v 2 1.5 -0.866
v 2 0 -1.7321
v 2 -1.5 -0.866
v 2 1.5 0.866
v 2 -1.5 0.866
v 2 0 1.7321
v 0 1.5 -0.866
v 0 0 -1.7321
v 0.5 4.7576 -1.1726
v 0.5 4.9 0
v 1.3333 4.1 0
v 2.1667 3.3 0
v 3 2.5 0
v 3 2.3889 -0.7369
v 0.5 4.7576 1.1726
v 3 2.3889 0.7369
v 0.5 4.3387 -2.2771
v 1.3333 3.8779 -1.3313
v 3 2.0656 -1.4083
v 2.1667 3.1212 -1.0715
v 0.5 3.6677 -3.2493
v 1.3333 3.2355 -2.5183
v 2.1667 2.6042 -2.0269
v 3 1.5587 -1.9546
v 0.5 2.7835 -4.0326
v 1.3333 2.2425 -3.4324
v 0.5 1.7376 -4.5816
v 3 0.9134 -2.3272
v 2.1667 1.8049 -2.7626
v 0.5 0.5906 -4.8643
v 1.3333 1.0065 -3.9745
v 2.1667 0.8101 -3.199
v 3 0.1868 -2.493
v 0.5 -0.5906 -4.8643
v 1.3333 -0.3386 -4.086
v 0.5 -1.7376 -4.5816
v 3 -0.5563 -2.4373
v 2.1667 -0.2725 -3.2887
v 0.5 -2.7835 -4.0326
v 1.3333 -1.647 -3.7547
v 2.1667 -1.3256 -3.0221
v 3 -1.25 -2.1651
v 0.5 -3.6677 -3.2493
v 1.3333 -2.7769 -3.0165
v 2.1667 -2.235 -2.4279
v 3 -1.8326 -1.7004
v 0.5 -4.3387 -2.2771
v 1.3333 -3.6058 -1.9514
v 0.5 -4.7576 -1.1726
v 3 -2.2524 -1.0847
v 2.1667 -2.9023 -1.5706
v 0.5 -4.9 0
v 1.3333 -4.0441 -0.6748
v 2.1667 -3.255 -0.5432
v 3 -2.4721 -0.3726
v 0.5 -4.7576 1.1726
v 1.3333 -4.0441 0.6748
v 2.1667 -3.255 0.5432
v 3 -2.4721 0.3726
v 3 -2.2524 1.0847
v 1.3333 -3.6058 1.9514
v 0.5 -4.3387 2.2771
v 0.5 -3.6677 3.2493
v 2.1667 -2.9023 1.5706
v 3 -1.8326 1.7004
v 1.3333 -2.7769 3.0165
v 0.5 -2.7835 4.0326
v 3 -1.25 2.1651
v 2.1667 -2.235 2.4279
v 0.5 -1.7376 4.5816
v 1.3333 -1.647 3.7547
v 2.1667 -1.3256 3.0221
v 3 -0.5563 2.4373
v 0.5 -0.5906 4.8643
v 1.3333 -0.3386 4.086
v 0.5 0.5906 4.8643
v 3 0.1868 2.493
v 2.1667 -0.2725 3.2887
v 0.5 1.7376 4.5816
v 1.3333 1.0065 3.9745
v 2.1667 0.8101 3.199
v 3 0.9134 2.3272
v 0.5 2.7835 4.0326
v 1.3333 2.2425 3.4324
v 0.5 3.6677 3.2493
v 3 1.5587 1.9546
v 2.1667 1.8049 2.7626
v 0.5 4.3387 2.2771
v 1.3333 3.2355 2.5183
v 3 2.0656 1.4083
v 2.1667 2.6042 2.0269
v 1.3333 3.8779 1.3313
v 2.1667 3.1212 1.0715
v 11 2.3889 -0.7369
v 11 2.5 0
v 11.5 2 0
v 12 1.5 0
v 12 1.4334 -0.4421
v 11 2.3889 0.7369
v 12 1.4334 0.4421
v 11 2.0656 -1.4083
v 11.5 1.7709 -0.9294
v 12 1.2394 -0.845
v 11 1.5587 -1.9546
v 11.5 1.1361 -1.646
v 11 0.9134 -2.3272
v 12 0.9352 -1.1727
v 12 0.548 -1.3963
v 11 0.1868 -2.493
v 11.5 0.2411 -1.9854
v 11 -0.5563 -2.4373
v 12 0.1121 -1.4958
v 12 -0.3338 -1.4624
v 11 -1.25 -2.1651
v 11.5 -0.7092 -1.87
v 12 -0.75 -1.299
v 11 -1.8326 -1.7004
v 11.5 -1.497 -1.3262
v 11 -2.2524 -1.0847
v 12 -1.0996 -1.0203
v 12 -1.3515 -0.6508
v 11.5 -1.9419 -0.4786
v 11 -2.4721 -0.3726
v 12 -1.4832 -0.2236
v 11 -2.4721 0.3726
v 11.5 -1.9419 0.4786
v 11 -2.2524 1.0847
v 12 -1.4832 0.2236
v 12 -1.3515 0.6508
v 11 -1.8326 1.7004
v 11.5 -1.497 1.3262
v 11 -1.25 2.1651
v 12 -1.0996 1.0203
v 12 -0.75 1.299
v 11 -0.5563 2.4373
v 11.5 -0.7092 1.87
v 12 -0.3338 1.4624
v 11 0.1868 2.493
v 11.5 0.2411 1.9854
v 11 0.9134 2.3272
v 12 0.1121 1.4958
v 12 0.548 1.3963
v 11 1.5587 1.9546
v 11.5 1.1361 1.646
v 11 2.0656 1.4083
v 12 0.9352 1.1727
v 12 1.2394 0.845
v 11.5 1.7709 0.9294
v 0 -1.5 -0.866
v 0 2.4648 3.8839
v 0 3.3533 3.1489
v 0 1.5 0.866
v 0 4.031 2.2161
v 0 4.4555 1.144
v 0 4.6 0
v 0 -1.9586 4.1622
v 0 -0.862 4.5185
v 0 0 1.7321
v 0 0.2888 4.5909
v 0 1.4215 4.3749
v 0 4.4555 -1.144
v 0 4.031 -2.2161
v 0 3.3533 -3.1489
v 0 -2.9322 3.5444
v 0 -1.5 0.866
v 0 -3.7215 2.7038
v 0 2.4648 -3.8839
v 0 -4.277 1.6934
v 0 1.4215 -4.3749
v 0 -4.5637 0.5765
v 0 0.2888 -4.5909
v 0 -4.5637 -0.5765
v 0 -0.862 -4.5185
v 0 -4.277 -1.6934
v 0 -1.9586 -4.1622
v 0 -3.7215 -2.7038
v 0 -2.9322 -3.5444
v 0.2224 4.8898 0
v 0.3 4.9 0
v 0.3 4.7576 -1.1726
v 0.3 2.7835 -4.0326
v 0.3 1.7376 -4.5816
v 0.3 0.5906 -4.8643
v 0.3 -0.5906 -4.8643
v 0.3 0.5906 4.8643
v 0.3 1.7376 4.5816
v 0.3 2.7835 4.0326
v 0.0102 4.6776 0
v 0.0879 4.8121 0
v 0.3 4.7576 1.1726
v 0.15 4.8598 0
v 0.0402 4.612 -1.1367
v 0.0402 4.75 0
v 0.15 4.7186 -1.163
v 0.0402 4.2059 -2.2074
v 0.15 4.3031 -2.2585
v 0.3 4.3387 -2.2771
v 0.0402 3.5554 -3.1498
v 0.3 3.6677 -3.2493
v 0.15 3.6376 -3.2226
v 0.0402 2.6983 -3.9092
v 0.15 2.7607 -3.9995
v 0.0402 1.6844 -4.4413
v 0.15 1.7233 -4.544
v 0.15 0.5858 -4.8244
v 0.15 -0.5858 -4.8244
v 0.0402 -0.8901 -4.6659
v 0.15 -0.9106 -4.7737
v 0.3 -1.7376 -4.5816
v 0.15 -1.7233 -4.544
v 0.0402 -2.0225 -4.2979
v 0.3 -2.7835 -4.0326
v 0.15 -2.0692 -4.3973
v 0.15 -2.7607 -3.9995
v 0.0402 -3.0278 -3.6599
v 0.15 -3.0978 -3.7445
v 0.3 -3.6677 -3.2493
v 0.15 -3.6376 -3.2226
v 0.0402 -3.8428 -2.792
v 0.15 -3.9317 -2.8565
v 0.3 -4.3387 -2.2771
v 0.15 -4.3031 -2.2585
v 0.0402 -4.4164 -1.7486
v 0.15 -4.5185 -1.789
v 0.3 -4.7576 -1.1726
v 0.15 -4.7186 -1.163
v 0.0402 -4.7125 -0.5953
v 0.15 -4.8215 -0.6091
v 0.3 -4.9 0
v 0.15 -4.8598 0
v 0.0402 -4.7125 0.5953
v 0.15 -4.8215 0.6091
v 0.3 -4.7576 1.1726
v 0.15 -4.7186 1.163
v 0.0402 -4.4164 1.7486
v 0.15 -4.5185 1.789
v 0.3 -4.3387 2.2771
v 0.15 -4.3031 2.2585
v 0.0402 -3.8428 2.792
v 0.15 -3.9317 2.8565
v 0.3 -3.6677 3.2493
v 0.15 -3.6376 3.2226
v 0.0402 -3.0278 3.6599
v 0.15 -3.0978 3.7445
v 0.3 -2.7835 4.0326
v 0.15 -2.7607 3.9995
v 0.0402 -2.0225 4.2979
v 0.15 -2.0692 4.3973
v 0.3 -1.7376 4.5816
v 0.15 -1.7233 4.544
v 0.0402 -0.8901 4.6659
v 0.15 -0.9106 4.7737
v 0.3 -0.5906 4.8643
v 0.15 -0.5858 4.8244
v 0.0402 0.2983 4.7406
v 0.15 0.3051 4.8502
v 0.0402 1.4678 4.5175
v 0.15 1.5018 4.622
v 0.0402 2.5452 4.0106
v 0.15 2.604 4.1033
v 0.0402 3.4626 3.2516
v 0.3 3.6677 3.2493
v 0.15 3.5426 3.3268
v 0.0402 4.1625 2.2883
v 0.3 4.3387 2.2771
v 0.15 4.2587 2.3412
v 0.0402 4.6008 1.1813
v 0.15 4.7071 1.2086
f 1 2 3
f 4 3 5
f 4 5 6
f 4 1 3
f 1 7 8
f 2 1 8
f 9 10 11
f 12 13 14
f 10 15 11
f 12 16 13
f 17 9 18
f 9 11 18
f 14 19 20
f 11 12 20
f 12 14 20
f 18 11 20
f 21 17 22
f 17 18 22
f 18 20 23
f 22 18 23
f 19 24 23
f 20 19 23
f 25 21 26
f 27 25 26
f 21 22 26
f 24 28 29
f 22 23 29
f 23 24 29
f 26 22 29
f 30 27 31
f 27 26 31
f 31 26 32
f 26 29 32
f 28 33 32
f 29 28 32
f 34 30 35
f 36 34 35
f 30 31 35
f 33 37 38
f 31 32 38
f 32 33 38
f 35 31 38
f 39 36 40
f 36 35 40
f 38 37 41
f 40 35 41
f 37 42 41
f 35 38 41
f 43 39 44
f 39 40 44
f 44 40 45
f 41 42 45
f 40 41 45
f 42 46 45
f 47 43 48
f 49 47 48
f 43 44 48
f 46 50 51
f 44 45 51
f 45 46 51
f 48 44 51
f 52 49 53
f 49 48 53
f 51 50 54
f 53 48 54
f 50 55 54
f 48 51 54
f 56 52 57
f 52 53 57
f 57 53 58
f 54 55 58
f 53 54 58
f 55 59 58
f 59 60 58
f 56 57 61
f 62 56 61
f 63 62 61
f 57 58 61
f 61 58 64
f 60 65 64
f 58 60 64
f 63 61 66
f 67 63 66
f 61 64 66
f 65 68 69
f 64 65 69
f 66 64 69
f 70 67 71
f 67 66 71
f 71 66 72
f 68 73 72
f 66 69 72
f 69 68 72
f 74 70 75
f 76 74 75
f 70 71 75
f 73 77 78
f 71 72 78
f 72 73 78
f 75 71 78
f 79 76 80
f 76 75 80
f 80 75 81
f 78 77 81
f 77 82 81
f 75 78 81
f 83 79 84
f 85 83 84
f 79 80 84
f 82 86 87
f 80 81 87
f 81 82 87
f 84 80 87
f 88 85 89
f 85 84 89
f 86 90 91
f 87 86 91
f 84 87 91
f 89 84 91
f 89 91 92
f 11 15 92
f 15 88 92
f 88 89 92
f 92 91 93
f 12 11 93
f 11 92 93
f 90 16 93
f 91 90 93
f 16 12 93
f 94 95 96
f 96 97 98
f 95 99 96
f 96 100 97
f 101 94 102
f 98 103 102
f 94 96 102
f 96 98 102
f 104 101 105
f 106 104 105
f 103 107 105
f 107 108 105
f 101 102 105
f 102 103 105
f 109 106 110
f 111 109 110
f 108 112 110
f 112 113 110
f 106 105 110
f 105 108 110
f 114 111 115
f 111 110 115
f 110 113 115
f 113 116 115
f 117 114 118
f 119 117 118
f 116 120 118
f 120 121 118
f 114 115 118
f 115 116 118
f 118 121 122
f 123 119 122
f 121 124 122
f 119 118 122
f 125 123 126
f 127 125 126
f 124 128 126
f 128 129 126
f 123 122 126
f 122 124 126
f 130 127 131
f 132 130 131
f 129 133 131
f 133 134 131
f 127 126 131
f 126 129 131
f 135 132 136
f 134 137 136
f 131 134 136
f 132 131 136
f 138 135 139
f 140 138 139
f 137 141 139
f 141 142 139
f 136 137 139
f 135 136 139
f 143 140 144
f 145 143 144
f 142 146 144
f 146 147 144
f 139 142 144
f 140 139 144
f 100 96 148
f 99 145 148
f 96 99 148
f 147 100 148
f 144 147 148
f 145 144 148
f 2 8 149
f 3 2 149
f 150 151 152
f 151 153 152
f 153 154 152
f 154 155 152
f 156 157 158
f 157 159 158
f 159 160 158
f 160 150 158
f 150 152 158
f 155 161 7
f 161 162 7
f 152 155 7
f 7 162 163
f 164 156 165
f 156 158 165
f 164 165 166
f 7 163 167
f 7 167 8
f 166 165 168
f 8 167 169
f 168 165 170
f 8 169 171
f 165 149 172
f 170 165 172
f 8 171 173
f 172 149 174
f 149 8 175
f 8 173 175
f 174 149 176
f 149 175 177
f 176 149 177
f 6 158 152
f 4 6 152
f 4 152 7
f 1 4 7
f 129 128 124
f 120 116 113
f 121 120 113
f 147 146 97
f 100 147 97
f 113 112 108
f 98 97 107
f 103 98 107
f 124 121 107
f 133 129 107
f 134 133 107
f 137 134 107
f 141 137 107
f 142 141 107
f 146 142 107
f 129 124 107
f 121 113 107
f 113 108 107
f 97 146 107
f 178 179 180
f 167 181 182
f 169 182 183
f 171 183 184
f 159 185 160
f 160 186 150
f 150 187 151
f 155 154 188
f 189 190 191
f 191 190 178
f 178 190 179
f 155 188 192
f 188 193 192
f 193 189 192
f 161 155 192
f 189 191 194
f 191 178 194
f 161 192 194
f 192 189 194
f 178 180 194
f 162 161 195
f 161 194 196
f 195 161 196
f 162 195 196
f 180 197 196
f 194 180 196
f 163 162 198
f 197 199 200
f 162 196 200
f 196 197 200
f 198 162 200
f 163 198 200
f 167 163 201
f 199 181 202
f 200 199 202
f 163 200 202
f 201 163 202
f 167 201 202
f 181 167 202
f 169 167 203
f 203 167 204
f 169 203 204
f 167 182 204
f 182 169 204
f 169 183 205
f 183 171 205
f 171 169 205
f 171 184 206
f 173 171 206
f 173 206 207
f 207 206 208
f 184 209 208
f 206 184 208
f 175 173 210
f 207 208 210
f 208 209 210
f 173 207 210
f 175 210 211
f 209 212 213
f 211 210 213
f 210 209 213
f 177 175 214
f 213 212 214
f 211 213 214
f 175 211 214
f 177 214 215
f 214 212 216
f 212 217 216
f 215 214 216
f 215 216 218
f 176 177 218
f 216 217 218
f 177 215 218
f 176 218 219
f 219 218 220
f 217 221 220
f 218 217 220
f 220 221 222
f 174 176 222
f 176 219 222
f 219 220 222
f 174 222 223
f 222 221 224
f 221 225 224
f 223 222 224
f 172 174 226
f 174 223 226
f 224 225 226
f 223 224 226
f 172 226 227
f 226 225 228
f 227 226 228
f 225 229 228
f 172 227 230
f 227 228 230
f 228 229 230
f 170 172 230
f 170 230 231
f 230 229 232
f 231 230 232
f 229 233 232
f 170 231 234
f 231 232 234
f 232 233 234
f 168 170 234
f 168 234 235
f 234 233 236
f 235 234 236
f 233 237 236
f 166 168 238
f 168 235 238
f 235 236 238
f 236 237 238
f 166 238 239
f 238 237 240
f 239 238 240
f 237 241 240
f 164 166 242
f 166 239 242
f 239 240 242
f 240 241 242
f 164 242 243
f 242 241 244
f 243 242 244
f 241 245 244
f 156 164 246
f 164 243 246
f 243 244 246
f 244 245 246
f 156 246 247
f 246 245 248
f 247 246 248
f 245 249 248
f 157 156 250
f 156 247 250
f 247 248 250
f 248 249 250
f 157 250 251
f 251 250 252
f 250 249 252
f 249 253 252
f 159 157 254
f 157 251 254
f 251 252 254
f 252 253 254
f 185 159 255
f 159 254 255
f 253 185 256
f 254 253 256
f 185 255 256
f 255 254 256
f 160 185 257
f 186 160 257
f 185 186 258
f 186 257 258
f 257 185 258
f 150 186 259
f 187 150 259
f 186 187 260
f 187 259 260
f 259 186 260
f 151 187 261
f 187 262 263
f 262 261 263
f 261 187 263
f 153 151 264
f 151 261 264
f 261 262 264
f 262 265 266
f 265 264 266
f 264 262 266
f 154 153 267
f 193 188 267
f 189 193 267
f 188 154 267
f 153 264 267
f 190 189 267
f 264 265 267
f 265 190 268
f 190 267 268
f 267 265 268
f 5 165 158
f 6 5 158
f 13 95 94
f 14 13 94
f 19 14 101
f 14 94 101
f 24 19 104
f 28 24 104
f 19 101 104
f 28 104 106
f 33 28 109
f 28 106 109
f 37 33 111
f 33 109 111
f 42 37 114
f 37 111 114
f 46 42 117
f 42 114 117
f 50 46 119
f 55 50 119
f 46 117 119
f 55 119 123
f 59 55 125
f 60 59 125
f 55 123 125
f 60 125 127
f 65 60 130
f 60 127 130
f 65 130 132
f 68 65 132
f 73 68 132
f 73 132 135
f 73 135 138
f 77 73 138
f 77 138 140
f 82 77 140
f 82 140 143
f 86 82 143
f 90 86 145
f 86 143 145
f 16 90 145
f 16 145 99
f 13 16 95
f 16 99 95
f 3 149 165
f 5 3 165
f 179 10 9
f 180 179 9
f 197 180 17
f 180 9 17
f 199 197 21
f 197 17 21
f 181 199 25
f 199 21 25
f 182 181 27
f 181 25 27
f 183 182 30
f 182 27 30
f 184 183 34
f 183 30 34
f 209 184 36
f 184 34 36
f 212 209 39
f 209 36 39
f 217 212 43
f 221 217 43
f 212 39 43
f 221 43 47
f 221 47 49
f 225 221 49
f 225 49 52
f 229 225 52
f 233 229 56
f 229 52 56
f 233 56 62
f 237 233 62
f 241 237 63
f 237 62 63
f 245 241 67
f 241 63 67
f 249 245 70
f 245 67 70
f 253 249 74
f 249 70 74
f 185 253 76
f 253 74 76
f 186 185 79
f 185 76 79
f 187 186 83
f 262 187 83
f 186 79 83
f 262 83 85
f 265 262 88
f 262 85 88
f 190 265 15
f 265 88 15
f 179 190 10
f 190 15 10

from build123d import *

# Parameters (mm, degrees)
CUT_EXTRUDE_1_DEPTH = 2
FILLET_1_R          = 0.3
CHAMFER_1_SIZE      = 1


with BuildPart() as part:
    # Эскиз1 → Повернуть1 (revolve)
    with BuildSketch(Plane.XY):
        Polygon((0, 0), (0, 4.9), (0.5, 4.9), (3, 2.5), (12, 2.5), (12, 0), align=None)
    revolve(axis=Axis((12, 0, 0), (-1, 0, 0)))

    # Эскиз2 → Вырез-Вытянуть1 (cut)
    with BuildSketch(Plane.ZY):
        Polygon((0.866025404, 1.5), (-0.866025404, 1.5), (-1.732050808, 0), (-0.866025404, -1.5), (0.866025404, -1.5), (1.732050808, 0), align=None)
    extrude(amount=-CUT_EXTRUDE_1_DEPTH, mode=Mode.SUBTRACT)

    # Скругление1
    fillet_1_edges = [part.edges().sort_by_distance(p)[0] for p in [
        (0, -4.9, 0),
    ]]
    fillet(fillet_1_edges, radius=FILLET_1_R)

    # Фаска1
    chamfer_1_edges = [part.edges().sort_by_distance(p)[0] for p in [
        (12, -2.5, 0),
    ]]
    chamfer(chamfer_1_edges, length=CHAMFER_1_SIZE)


solid = part.part
